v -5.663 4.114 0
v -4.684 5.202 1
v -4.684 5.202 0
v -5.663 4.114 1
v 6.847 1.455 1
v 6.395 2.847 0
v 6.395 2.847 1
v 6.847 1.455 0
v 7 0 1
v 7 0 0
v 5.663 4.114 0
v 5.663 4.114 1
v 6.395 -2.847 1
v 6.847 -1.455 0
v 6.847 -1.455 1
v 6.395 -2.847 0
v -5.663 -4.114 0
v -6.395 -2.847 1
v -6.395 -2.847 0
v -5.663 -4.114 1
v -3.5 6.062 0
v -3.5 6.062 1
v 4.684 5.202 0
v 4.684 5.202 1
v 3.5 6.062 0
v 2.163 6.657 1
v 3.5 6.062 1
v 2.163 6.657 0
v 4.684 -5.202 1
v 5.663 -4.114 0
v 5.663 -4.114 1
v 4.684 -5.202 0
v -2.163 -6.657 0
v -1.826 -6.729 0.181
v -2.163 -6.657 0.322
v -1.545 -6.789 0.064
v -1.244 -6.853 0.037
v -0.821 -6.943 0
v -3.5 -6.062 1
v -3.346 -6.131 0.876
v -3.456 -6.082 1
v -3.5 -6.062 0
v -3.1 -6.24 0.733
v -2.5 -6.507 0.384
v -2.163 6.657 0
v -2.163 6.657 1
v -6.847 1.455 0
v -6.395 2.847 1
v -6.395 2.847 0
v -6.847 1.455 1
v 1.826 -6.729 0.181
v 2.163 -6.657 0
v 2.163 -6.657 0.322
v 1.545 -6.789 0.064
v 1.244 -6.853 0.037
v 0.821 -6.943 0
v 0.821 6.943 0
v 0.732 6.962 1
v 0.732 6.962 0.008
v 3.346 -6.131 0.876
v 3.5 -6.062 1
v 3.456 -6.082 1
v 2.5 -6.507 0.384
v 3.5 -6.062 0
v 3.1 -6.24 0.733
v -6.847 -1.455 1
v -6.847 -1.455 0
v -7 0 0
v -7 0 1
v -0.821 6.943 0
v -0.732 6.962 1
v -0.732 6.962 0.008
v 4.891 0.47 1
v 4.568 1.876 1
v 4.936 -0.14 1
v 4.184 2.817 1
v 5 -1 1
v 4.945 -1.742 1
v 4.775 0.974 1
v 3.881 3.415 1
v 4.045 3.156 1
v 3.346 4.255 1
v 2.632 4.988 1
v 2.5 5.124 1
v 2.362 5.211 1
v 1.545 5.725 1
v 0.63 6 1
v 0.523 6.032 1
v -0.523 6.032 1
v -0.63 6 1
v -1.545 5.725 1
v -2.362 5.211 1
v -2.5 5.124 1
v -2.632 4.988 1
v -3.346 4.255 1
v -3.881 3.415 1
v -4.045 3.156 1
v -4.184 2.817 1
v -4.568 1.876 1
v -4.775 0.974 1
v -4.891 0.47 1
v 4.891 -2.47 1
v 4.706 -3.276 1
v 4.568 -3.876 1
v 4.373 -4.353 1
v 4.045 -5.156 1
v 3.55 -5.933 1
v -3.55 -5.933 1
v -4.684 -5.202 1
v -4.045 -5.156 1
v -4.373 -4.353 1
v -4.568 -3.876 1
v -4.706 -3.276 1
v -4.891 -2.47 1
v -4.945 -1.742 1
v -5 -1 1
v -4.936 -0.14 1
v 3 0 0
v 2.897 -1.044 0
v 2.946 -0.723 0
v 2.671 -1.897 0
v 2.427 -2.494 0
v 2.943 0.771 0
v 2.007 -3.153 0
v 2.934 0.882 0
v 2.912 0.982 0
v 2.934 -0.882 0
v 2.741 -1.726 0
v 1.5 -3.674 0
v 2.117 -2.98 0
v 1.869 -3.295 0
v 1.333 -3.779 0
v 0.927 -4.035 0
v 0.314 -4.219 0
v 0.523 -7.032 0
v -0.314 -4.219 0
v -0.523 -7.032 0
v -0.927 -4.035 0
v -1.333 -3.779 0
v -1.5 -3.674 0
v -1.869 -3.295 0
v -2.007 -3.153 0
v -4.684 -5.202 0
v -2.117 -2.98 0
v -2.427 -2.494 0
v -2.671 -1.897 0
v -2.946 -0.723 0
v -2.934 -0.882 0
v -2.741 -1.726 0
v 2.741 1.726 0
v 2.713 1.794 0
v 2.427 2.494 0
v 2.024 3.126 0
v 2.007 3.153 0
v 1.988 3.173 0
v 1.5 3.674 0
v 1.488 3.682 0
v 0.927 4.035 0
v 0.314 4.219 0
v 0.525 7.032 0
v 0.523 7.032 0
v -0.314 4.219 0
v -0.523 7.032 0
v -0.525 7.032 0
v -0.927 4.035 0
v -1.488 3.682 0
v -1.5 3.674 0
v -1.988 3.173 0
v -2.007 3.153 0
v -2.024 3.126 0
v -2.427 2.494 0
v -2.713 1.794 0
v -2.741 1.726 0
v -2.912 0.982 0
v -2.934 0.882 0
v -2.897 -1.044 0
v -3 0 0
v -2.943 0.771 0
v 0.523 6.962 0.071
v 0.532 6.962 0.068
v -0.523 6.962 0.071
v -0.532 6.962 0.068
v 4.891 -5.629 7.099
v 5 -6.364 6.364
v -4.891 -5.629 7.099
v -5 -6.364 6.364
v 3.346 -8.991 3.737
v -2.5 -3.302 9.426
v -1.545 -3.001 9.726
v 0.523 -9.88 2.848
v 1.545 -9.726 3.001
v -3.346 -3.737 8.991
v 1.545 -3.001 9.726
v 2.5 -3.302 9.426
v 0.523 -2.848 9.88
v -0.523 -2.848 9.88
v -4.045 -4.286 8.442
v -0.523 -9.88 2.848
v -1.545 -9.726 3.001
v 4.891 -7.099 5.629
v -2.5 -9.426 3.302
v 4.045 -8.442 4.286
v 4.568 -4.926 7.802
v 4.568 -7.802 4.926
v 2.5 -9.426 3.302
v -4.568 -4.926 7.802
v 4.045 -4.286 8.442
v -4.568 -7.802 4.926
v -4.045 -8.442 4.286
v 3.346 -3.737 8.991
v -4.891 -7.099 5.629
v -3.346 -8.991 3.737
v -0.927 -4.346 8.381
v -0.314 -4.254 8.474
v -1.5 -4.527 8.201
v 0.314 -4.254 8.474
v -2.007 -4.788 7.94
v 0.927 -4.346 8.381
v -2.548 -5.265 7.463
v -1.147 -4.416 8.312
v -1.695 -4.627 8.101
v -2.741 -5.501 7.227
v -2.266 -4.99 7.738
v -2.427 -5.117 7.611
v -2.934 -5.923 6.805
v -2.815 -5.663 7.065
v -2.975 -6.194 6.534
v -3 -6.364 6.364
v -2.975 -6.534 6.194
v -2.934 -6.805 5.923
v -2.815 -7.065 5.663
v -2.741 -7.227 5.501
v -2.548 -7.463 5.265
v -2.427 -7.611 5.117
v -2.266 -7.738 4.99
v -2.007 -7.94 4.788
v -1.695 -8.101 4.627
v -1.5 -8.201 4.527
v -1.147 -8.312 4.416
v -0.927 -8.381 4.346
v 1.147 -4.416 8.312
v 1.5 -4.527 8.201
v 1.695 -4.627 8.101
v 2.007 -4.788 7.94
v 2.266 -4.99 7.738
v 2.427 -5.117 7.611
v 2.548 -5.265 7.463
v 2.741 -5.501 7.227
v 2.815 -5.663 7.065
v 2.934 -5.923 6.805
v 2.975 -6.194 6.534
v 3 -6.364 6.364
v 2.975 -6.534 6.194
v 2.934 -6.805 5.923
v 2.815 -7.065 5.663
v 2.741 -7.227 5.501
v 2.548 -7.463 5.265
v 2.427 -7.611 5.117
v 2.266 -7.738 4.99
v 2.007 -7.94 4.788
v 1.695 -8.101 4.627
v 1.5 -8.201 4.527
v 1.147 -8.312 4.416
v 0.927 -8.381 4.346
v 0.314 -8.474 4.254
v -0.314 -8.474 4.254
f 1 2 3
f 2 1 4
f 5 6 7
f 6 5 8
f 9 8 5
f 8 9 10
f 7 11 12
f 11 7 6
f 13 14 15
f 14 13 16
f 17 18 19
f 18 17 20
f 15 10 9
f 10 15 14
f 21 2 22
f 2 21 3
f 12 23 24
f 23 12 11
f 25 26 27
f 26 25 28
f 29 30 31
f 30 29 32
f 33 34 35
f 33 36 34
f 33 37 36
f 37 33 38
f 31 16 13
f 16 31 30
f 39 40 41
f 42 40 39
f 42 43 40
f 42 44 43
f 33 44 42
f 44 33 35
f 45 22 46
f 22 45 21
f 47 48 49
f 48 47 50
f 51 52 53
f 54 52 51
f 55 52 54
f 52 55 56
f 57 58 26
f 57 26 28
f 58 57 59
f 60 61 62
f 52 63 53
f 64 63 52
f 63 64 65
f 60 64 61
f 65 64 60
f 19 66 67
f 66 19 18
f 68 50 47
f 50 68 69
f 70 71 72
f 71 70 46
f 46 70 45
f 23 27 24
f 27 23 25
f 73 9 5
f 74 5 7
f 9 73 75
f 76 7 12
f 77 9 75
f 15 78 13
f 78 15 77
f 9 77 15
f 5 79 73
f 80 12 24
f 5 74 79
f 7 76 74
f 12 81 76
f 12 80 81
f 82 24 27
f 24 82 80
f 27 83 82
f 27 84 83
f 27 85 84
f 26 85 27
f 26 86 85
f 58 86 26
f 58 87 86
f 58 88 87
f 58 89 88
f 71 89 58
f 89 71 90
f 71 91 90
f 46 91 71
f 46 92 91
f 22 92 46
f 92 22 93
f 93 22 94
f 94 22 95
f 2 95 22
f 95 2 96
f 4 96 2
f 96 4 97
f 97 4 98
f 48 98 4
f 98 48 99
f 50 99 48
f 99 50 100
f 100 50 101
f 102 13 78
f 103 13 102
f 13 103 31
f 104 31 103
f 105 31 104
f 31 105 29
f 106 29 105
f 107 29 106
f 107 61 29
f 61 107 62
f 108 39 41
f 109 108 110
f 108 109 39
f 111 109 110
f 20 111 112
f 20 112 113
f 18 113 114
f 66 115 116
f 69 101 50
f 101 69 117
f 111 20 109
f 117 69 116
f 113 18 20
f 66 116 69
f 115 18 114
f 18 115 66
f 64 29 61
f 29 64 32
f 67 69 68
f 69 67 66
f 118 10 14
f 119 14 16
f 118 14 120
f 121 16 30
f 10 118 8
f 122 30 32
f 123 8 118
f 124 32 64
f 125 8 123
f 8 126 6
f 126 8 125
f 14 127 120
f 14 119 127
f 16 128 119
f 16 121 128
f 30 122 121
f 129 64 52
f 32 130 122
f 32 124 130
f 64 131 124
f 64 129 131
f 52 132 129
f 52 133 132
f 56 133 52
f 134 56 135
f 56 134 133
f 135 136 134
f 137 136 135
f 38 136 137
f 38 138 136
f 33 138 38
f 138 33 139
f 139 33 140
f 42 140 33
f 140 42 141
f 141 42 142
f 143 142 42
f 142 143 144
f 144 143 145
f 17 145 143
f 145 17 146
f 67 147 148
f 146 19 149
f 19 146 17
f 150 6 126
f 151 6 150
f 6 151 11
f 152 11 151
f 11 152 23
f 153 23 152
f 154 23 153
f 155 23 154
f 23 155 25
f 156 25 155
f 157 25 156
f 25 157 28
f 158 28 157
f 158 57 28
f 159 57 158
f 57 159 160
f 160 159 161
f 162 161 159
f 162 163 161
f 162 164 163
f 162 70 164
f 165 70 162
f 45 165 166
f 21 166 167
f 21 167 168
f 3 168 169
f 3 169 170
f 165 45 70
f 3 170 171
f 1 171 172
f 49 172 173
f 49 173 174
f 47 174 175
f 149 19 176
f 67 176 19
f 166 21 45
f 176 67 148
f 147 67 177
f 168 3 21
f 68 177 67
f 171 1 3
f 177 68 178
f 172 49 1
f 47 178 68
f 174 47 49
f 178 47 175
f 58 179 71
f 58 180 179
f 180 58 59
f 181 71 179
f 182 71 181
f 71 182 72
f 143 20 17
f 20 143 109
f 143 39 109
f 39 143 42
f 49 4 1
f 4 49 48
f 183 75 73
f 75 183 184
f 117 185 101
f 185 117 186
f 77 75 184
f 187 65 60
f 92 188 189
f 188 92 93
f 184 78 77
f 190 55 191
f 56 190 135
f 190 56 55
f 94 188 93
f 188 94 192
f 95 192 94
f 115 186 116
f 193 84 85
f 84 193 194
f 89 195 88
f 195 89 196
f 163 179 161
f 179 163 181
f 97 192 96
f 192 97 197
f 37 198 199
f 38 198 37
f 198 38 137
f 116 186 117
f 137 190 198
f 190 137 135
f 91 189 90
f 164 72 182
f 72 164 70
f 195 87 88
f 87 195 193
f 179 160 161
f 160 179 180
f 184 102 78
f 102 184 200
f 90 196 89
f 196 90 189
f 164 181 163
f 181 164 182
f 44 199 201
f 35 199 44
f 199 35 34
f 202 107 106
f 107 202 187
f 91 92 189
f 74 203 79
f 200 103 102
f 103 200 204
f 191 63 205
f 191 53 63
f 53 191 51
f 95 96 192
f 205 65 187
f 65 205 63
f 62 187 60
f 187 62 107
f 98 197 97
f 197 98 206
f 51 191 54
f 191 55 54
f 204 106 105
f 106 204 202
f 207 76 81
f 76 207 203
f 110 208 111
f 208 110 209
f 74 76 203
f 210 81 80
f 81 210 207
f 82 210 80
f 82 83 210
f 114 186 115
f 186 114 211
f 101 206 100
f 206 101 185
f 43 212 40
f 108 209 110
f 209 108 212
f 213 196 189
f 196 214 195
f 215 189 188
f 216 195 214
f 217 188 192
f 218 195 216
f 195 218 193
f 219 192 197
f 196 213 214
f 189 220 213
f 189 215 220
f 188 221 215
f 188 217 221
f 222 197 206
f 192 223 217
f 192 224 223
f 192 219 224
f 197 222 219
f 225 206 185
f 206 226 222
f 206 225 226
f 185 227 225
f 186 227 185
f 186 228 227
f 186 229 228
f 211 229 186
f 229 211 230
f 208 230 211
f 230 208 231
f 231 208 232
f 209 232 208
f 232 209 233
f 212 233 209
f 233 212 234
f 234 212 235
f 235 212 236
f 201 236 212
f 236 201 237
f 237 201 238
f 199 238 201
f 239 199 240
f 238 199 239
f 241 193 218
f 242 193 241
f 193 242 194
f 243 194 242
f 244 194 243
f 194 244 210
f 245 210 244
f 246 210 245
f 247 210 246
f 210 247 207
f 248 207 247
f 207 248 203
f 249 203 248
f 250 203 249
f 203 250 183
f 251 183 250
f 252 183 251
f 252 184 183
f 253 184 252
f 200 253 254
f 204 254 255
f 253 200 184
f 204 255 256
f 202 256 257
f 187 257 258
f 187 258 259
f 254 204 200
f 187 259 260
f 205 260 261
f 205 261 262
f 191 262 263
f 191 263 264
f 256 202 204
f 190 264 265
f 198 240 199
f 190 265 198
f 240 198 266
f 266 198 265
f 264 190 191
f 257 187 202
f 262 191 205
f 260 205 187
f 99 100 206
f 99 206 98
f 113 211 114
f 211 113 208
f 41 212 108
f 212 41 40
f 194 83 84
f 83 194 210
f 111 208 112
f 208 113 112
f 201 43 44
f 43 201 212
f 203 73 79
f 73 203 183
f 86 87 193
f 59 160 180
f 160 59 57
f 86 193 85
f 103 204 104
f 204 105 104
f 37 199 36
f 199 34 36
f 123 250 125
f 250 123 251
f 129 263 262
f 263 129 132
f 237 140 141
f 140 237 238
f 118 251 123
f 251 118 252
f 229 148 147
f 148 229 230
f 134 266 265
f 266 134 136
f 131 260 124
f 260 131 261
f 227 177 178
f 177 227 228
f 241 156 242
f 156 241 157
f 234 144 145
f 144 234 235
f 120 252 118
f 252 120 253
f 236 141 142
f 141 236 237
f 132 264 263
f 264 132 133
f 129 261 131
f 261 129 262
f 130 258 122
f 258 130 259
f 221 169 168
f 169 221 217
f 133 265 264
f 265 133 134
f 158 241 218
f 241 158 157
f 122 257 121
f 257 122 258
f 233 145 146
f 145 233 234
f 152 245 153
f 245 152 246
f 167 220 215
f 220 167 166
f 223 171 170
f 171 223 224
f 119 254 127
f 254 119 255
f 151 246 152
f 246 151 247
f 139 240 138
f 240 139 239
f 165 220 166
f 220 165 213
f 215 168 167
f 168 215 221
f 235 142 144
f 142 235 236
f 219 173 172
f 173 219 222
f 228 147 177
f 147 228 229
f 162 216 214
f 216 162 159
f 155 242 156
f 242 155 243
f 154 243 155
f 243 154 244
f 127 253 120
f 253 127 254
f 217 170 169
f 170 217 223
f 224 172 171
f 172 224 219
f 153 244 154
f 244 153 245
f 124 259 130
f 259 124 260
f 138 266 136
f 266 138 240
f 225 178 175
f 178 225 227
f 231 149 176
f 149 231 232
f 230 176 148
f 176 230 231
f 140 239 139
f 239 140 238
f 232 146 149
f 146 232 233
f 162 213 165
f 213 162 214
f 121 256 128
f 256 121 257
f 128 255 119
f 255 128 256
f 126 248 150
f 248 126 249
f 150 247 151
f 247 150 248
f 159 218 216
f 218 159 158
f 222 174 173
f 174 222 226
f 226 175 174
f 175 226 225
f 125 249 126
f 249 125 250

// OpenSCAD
$fn=30;

difference()
{
    union()
    {
        led_holder();
    }
}
module led_holder()
{
    difference()
    {
        union()
        {            
            cylinder(h=1, r=7);
            rotate([45,0,0]) translate([0,0,-5]) cylinder(h=14, r=5);
        }
        rotate([45,0,0]) translate([0,0,-3]) cylinder(h=19.5, r=3);
        translate([-10,-10,-10]) cube([20,20,10]);
    }
}
